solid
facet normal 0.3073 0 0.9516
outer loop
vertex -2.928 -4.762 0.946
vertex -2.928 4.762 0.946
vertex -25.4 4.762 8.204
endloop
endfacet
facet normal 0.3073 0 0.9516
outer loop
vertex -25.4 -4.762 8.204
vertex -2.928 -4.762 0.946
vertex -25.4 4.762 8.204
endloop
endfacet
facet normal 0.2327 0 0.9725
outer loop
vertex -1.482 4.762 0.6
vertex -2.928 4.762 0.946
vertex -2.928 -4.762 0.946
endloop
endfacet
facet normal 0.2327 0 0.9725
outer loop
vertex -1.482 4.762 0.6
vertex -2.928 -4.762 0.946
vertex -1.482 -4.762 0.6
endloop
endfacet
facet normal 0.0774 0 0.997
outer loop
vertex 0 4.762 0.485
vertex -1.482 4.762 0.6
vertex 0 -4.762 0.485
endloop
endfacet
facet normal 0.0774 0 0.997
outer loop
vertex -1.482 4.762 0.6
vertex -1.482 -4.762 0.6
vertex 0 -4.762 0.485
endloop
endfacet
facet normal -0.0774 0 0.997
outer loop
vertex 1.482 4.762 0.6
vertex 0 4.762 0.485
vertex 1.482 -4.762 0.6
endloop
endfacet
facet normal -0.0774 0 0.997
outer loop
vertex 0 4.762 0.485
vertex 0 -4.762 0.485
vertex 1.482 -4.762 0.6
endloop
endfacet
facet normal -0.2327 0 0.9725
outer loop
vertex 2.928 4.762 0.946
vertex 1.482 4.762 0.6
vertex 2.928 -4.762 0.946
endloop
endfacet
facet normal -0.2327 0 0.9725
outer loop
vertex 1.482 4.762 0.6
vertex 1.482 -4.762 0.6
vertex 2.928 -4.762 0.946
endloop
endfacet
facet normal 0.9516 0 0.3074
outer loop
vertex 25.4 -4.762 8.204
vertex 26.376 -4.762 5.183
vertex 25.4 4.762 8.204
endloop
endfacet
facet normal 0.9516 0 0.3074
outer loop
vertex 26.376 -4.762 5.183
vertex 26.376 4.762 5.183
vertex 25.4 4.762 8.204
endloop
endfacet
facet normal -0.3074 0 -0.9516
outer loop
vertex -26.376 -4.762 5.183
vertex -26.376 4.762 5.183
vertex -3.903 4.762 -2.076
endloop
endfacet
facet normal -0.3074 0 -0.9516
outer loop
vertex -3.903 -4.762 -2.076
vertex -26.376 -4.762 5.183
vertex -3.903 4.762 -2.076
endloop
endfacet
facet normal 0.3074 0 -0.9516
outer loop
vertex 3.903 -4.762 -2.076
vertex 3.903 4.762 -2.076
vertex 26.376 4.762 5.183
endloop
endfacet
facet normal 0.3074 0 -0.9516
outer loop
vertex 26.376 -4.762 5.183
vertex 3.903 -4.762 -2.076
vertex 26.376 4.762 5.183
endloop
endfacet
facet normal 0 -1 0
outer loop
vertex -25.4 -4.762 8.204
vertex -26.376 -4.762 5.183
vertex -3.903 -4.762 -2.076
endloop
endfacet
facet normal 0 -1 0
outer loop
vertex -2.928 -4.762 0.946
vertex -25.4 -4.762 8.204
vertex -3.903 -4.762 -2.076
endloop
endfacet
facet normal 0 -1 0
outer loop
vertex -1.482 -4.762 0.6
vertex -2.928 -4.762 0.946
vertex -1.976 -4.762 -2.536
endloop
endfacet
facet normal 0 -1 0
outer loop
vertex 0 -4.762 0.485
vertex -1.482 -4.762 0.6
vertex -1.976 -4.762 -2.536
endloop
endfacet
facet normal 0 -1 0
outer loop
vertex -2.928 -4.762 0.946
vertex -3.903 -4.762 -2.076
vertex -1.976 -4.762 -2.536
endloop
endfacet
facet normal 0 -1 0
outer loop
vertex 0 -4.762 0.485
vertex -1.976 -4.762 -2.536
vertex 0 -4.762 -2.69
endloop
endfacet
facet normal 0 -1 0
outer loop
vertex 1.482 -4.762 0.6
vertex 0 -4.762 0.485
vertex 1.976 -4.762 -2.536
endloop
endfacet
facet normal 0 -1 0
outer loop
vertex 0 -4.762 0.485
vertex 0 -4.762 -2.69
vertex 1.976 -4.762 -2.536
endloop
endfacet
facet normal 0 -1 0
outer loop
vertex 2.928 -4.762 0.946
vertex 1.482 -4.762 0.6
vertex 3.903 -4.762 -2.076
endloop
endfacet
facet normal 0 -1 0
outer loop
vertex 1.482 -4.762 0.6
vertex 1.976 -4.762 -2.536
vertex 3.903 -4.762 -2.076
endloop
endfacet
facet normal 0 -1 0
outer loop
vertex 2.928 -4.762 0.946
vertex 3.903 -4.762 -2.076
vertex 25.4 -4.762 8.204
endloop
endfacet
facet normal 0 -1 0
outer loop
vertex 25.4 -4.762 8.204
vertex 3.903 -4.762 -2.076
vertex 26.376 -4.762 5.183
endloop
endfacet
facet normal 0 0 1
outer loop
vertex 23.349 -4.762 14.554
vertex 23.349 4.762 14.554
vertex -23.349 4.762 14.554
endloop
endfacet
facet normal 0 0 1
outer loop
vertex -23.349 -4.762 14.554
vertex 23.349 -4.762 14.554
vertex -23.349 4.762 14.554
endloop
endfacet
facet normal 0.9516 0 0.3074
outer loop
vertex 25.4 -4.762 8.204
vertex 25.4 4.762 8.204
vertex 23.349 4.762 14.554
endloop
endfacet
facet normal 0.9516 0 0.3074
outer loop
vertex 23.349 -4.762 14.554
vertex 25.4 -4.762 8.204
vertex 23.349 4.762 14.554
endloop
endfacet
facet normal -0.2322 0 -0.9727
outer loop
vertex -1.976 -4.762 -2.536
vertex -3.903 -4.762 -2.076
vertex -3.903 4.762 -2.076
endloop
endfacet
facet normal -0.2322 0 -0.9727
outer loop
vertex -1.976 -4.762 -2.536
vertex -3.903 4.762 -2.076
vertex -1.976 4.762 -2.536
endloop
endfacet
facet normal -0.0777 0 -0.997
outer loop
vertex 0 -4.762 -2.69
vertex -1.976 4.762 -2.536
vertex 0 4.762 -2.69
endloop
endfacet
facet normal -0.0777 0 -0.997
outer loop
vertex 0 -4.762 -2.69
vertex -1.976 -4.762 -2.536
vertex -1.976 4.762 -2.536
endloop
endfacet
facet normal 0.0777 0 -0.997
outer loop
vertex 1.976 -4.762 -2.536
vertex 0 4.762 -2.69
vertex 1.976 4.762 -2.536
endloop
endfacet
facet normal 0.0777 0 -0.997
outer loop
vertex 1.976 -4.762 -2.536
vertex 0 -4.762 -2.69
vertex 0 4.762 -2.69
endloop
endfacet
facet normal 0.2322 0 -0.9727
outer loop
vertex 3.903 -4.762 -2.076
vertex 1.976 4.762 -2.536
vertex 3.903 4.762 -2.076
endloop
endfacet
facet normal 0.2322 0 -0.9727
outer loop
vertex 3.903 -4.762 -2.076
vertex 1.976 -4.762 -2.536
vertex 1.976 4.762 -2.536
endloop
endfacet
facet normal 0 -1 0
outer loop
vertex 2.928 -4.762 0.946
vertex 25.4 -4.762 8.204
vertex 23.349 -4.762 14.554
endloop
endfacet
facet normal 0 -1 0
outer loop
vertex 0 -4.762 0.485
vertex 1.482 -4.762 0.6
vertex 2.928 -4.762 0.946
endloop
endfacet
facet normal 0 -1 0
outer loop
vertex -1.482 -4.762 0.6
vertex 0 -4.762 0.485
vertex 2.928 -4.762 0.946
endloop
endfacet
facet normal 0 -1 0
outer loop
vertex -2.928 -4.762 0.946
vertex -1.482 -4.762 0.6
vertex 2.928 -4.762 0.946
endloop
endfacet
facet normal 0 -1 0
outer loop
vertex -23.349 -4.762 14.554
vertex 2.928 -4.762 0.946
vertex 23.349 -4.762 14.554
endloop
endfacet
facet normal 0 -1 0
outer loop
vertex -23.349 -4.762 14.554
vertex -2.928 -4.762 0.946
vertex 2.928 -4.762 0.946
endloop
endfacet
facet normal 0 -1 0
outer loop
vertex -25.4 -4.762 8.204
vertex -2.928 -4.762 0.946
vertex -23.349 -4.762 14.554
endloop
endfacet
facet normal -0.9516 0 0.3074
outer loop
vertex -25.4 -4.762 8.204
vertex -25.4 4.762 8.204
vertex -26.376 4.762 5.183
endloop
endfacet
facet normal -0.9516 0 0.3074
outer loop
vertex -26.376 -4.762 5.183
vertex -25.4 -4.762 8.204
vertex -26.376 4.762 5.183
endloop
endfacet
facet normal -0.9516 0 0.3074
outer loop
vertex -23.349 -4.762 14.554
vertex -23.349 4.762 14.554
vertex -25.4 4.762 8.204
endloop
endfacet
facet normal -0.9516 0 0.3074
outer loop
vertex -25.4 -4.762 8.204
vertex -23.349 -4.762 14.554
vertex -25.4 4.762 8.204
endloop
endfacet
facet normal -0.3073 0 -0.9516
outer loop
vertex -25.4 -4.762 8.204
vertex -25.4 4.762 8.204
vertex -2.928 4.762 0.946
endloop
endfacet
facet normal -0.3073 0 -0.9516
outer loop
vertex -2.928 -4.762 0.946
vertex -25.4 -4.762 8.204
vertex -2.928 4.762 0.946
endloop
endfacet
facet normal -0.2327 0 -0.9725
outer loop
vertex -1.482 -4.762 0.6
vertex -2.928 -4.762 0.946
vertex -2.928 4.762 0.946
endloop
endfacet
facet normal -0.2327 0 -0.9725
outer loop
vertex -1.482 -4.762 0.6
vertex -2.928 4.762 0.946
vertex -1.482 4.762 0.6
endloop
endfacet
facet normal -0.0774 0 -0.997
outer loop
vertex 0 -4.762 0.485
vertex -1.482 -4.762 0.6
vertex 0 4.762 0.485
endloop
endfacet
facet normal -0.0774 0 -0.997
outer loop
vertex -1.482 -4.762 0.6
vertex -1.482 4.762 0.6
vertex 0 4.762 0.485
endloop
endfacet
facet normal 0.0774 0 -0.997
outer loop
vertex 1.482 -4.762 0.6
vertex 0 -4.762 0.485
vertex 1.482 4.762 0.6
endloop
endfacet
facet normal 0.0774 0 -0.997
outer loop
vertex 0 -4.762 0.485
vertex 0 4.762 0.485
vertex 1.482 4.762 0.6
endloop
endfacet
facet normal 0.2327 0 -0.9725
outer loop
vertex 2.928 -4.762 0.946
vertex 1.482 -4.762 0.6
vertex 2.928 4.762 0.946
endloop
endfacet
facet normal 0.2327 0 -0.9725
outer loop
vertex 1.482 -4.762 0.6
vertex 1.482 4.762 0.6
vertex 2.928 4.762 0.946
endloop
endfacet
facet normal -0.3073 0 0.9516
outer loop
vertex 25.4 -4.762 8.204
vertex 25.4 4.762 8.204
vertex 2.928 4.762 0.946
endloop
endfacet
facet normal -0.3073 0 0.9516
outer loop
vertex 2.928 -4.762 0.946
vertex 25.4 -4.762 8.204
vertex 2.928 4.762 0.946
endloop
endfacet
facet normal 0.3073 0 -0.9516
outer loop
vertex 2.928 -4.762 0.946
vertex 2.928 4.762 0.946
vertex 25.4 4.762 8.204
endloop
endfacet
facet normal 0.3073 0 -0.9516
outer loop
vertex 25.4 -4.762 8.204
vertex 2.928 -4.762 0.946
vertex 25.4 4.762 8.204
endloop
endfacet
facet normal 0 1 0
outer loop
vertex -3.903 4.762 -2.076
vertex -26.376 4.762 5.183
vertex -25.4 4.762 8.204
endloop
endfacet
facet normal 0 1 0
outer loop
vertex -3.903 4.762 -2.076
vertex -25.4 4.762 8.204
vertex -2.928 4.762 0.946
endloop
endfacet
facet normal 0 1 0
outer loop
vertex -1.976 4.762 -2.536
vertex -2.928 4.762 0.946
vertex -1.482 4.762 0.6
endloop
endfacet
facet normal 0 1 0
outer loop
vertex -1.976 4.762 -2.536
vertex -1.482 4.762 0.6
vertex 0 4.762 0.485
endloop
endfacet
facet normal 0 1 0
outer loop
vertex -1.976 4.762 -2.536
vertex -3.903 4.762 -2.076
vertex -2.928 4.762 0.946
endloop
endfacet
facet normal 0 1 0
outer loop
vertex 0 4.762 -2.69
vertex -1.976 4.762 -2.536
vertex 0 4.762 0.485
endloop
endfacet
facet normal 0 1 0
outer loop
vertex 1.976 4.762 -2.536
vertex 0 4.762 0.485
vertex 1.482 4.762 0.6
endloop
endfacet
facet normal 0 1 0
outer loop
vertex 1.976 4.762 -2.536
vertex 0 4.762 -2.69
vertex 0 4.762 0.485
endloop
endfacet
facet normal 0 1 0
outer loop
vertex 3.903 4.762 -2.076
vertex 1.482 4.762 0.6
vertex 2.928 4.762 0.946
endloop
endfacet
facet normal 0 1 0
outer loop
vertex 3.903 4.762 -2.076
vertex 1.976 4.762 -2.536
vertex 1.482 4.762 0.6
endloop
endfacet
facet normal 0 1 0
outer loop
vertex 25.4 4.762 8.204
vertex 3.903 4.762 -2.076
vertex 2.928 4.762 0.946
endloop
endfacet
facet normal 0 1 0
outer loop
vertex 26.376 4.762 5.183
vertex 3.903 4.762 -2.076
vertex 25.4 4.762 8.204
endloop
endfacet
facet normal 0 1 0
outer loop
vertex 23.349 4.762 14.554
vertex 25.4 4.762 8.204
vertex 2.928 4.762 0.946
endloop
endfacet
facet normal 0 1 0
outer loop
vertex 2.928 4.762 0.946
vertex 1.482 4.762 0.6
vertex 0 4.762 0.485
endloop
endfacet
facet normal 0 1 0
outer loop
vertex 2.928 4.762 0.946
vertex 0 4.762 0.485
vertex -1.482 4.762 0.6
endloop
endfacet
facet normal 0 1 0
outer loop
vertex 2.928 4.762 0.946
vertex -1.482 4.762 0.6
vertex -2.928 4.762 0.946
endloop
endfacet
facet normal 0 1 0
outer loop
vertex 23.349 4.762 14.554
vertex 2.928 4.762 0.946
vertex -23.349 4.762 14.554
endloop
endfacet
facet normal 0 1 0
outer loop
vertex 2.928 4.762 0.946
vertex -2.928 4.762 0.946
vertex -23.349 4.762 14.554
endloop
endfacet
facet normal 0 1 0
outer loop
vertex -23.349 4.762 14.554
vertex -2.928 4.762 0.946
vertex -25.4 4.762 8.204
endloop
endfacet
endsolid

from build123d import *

# Parameters (mm, degrees)
BOSS_EXTRUDE1_DEPTH    = 4.7625
BOSS_EXTRUDE2_DEPTH    = 9.525
CONVERT_SOLID1_START   = -4.7625
CONVERT_SOLID1_DEPTH   = 9.525
CONVERT_SOLID1_2_DEPTH = 9.525


# Read off the part's stored shape, not the designer's step: Convert-Solid1
with BuildPart() as part:
    # Sketch1 → Boss-Extrude1 (new, symmetric)
    with BuildSketch(Plane(origin=(0, 0, 0), x_dir=(1, 0, 0), z_dir=(0, 1, 0))):
        Polygon((0, 3.33650554), (26.375857262, -5.182664231), (25.4, -8.203976463), (0, 0), (-25.4, -8.203976463), (-26.375857262, -5.182664231), align=None)
    extrude(amount=BOSS_EXTRUDE1_DEPTH, both=True)

    # Convert-Solid1 outline → Convert-Solid1 (cut)
    with BuildSketch(Plane(origin=(0, 0, 0), x_dir=(1, 0, 0), z_dir=(0, 1, 0)).offset(CONVERT_SOLID1_START)):
        with BuildLine():
            ThreePointArc((-3.903429046, 2.07573231), (0, 2.690483381), (3.903429046, 2.07573231))
            Line((3.903429046, 2.07573231), (0, 3.33650554))
            Line((0, 3.33650554), (-3.903429046, 2.07573231))
        make_face()
    extrude(amount=CONVERT_SOLID1_DEPTH, mode=Mode.SUBTRACT)

    # Convert-Solid1 2 outline → Convert-Solid1 2 (add)
    with BuildSketch(Plane(origin=(0, 0, 0), x_dir=(1, 0, 0), z_dir=(0, 1, 0)).offset(CONVERT_SOLID1_START)):
        with BuildLine():
            ThreePointArc((-2.927571785, -0.945579922), (0, -0.484516619), (2.927571785, -0.945579922))
            Line((2.927571785, -0.945579922), (0, 0))
            Line((0, 0), (-2.927571785, -0.945579922))
        make_face()
    extrude(amount=CONVERT_SOLID1_2_DEPTH)


with BuildPart() as body_2:
    # Sketch3 → Boss-Extrude2 (new body)
    with BuildSketch(Plane(origin=(0, 4.7625, 0), x_dir=(1, 0, 0), z_dir=(0, 1, 0))):
        with BuildLine():
            Line((-25.4, -8.203976463), (-2.927571785, -0.945579922))
            ThreePointArc((-2.927571785, -0.945579922), (0, -0.484516619), (2.927571785, -0.945579922))
            Line((2.927571785, -0.945579922), (25.4, -8.203976463))
            Line((25.4, -8.203976463), (23.349005884, -14.553976463))
            Line((23.349005884, -14.553976463), (-23.349005884, -14.553976463))
            Line((-23.349005884, -14.553976463), (-25.4, -8.203976463))
        make_face()
    extrude(amount=-BOSS_EXTRUDE2_DEPTH)


solid = Compound([part.part, body_2.part])
